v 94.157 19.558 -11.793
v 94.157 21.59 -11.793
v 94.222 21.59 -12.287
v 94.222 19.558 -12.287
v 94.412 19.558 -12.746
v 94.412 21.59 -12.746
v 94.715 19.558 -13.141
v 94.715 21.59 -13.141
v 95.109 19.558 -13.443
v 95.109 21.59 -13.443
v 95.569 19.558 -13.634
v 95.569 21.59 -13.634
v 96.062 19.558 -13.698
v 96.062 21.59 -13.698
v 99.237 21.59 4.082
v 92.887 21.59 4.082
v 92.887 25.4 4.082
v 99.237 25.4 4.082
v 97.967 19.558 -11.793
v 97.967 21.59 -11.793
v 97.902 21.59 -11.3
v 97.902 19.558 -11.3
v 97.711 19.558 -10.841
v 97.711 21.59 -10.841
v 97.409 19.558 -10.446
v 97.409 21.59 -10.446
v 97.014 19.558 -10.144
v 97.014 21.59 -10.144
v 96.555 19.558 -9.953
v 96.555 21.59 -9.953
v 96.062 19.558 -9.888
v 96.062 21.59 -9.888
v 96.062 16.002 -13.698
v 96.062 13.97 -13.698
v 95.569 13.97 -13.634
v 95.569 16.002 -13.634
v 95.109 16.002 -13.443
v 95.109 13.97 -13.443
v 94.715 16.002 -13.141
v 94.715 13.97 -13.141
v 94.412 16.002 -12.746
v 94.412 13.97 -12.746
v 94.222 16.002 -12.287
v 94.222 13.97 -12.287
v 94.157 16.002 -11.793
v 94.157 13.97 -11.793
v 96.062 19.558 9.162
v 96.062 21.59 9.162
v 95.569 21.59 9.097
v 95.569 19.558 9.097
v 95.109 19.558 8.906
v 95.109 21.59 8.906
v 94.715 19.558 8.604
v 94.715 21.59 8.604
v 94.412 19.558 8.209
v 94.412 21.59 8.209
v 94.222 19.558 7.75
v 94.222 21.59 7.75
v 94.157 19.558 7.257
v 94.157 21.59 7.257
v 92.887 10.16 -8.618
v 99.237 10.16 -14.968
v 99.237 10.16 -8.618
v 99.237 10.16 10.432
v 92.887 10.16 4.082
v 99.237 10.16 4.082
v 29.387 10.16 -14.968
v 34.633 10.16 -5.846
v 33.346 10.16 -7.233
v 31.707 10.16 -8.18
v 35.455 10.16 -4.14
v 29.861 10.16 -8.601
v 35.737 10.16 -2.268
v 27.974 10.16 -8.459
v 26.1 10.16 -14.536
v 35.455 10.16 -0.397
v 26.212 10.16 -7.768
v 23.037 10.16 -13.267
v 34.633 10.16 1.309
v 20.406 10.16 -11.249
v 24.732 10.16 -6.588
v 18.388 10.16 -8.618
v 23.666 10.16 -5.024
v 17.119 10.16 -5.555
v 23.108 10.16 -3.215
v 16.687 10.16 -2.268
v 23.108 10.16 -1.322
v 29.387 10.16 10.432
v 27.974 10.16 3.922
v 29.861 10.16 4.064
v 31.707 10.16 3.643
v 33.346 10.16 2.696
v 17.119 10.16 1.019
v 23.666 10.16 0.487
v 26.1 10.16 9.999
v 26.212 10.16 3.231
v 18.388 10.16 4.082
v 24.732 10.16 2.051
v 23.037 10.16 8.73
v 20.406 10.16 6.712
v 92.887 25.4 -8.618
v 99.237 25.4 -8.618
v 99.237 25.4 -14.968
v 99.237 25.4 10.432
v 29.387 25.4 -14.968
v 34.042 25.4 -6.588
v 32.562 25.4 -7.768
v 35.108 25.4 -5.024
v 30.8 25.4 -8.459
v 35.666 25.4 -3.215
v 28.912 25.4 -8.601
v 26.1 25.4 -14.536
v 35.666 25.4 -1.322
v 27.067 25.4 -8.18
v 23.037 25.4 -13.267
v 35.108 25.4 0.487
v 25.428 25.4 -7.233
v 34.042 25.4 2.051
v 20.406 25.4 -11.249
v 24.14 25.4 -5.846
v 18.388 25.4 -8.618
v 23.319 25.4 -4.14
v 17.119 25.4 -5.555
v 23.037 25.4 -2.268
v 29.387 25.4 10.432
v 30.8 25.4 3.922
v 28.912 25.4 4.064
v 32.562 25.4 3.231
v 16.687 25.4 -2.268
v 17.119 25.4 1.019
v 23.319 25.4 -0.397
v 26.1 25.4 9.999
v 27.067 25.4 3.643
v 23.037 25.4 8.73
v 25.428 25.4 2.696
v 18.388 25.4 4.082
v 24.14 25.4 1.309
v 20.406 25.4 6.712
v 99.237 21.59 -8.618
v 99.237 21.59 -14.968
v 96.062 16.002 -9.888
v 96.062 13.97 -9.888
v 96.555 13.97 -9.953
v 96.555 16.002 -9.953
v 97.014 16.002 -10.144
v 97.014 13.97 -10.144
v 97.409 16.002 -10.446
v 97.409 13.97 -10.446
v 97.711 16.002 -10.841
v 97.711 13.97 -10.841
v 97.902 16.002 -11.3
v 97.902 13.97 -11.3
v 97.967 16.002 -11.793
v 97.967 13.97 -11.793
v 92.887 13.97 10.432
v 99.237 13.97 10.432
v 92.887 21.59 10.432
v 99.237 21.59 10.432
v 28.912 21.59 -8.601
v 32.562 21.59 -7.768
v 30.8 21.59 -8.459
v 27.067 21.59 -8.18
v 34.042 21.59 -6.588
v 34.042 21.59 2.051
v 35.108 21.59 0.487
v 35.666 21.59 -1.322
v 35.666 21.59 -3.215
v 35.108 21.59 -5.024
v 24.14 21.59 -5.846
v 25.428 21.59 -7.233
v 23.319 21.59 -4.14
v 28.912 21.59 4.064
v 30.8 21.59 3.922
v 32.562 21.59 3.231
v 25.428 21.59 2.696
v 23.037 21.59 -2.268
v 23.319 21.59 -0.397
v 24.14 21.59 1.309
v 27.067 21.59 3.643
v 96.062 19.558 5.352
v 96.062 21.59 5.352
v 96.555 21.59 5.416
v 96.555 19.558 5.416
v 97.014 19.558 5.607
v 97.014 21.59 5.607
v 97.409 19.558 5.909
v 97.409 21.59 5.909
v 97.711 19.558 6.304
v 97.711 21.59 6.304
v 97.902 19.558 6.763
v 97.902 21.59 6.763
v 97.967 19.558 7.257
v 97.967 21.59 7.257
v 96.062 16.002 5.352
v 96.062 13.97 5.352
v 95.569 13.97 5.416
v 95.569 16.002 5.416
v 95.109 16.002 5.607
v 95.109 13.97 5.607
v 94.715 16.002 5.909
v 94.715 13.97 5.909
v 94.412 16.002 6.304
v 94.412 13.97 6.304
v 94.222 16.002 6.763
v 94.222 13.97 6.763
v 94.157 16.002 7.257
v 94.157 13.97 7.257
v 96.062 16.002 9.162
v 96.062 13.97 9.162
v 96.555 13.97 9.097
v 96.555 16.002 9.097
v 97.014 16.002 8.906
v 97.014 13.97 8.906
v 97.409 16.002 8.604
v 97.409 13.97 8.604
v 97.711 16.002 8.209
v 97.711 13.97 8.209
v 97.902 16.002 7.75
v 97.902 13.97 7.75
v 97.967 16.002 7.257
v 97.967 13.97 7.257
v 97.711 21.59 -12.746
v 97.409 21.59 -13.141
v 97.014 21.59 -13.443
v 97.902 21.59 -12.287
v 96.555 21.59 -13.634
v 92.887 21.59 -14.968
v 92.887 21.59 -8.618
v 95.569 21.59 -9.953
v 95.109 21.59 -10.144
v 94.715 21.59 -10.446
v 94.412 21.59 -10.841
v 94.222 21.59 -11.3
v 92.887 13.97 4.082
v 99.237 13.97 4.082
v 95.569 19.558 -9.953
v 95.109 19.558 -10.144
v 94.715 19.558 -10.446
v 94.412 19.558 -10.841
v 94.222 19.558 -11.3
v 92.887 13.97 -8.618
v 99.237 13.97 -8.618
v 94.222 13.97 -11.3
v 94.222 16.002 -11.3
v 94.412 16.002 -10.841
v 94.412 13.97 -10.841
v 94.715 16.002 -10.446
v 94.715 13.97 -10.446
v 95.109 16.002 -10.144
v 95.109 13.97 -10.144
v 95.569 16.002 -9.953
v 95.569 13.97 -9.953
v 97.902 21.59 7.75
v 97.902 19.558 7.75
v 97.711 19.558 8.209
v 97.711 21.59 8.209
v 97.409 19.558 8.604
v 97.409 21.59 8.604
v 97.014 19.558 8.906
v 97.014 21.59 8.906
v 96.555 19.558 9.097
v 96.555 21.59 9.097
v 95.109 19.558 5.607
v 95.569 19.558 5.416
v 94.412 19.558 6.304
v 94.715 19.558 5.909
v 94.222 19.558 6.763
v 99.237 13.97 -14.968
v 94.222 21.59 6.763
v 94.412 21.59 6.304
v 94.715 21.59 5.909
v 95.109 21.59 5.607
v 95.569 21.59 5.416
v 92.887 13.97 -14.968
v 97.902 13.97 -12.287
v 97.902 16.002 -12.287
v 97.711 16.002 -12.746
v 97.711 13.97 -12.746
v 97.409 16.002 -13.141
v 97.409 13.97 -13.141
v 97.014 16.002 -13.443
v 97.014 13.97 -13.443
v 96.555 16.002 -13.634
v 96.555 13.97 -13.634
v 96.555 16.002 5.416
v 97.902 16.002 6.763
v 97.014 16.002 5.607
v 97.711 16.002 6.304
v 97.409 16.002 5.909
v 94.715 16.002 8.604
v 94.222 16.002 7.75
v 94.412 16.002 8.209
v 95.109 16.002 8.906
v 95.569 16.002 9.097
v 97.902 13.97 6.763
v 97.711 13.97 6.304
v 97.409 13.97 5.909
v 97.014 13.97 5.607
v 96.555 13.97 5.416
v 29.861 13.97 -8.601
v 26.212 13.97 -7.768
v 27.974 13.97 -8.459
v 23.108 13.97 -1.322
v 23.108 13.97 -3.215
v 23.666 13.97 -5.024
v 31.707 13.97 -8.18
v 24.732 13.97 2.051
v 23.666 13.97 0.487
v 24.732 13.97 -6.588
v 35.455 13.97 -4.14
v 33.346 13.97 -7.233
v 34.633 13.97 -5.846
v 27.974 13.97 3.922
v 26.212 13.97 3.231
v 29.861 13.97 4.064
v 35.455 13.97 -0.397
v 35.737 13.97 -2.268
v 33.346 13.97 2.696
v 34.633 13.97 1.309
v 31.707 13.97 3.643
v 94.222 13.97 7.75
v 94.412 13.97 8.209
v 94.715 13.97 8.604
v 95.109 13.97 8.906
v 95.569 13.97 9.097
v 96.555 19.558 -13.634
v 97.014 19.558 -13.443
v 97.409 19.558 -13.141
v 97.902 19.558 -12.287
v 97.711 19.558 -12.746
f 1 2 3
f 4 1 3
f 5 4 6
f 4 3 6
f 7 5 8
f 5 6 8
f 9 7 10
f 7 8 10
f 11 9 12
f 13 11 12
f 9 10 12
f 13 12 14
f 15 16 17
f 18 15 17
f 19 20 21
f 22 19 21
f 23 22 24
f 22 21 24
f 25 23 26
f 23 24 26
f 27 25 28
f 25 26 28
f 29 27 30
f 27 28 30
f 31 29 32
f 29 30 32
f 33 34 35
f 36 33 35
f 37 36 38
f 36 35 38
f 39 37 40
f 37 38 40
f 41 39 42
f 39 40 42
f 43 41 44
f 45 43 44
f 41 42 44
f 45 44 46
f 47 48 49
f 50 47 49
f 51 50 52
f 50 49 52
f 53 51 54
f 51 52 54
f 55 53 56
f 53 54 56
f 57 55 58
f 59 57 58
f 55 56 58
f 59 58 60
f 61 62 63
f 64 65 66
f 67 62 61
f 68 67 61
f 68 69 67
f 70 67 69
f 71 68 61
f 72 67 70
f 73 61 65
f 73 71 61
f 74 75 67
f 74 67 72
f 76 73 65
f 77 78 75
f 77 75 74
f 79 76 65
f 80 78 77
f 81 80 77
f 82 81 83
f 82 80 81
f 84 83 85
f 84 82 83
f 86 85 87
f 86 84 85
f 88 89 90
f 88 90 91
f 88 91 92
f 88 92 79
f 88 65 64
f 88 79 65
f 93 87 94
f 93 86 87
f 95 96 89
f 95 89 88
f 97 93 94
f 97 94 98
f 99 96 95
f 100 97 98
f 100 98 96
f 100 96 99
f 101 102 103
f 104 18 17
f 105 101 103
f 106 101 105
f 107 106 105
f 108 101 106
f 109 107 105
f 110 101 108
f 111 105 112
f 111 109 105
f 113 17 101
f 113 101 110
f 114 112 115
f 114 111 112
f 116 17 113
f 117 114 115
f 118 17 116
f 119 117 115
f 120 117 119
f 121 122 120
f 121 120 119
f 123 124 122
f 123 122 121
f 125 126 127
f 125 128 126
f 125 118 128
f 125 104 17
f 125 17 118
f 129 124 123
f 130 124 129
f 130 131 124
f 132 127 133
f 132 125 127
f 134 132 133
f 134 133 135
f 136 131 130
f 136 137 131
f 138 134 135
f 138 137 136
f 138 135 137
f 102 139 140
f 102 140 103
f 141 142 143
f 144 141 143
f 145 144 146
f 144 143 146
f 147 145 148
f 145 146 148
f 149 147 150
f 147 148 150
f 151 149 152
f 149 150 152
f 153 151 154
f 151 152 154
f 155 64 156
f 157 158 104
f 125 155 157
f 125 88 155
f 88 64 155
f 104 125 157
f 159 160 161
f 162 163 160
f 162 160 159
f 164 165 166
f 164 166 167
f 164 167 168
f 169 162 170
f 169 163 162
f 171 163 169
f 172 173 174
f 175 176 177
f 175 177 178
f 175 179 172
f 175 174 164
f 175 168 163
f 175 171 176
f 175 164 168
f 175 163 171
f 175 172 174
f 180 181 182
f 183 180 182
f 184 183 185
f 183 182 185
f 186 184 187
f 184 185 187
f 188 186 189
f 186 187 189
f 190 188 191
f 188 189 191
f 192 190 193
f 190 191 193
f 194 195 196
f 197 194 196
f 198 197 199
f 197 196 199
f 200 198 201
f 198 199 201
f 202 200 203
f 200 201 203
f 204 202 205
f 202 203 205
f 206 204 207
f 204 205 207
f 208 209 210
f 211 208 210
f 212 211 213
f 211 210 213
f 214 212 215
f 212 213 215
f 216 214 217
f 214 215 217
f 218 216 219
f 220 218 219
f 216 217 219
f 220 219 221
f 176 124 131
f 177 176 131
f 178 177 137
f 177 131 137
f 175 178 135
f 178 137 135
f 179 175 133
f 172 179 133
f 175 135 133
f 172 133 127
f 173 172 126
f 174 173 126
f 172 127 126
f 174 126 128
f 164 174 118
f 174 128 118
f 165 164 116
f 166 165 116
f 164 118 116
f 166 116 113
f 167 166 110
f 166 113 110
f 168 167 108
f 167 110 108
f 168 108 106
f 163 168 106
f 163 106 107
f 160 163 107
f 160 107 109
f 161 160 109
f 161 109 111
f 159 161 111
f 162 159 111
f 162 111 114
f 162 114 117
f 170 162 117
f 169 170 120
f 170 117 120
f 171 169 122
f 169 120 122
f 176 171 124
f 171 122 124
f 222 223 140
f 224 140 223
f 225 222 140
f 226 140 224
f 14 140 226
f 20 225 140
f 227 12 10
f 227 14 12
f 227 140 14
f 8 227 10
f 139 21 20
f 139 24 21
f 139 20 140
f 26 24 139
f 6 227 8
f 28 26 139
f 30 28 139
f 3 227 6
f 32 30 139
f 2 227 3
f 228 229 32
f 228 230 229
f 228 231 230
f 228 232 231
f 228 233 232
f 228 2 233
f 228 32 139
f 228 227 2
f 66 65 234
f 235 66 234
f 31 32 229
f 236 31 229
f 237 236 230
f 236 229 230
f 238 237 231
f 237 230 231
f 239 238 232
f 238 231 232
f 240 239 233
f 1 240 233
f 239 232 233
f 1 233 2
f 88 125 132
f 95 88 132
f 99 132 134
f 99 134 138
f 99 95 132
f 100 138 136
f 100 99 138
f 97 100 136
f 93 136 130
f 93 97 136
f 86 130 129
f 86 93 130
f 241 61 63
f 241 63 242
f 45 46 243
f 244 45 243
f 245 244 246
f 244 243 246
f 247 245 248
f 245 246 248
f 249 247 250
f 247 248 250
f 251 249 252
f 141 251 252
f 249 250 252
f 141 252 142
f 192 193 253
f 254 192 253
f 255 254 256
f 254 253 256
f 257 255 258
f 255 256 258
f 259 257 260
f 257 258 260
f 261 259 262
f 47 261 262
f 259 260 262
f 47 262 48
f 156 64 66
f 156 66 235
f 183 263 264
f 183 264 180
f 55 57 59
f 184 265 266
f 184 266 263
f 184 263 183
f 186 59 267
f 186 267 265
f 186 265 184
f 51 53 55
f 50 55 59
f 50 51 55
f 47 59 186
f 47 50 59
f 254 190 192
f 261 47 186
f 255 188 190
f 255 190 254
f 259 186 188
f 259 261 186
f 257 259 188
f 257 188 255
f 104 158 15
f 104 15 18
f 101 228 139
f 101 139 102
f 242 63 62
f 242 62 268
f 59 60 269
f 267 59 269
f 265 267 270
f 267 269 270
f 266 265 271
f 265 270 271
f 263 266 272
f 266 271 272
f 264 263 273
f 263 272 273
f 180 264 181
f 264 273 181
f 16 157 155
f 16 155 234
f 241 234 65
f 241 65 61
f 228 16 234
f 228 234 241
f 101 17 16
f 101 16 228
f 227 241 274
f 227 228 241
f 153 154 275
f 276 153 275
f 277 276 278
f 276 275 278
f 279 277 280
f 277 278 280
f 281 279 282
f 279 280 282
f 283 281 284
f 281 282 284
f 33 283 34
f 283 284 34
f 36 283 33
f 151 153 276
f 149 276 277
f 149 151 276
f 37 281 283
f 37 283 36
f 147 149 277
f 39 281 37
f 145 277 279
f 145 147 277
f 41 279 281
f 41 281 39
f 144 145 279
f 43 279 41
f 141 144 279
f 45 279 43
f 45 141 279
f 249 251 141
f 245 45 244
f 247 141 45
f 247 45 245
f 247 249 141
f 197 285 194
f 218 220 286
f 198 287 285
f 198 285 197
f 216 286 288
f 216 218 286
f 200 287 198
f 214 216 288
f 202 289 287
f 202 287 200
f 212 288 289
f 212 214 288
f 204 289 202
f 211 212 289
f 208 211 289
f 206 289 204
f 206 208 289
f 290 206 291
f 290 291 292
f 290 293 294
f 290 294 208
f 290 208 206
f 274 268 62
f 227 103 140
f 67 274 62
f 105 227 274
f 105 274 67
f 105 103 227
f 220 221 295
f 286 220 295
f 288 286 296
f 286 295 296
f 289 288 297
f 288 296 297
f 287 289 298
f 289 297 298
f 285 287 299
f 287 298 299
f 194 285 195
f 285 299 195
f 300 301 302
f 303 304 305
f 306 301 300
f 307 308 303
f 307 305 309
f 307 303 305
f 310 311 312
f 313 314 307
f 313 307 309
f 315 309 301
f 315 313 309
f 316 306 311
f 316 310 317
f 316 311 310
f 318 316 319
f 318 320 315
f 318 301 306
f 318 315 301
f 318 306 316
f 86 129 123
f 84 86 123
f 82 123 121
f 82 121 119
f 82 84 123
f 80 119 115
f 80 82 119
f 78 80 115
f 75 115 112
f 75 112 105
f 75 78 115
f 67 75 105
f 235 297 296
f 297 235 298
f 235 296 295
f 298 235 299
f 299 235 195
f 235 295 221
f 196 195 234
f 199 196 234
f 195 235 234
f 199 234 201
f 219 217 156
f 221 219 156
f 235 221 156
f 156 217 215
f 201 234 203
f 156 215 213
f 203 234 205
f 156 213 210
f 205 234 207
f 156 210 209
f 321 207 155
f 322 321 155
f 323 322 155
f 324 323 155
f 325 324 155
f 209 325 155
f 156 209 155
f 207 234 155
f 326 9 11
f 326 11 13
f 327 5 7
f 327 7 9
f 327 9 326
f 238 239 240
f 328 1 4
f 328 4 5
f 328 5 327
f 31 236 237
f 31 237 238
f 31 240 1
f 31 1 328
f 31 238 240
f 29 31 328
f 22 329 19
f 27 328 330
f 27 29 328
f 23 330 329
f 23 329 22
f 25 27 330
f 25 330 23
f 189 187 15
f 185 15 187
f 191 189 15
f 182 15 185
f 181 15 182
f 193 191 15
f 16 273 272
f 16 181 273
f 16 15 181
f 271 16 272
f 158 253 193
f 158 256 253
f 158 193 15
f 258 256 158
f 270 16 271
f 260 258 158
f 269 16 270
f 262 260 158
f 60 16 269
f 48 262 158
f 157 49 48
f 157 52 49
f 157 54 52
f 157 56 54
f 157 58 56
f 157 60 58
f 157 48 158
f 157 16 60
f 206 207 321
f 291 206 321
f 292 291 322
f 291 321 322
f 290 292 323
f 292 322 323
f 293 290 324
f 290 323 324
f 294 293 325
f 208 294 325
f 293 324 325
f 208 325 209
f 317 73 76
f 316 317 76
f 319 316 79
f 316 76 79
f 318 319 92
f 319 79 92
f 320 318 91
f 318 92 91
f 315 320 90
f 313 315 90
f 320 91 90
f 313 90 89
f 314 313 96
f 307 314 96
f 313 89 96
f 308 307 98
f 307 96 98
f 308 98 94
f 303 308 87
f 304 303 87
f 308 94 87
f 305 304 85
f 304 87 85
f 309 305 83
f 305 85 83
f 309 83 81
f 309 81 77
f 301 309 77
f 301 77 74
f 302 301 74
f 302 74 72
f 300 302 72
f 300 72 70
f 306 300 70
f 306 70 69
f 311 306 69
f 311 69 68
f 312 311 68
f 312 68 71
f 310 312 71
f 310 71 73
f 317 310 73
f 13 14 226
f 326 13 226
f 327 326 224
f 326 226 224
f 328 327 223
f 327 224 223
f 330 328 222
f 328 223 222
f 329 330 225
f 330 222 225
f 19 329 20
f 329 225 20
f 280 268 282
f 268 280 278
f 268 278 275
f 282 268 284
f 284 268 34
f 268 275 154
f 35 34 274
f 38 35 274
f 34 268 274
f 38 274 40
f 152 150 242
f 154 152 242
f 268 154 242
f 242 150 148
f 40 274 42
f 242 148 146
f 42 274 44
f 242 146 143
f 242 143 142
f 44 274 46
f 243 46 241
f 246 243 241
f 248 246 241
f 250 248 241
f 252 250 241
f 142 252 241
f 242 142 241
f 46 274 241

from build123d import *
from build123d import SkipClean  # not in build123d's __all__

# Parameters (mm, degrees)
F0_R      = 6.35
F1_DEPTH  = 25.4
F2_R      = 6.35
F3_DEPTH  = 25.4
F4_DEPTH  = 5.08
F5_DEPTH  = 8.89
F6_DEPTH  = 20.32
F7_DEPTH  = 10.16
F8_DEPTH  = 5.08
F9_DEPTH  = 13.97
F10_DEPTH = 3.81
F11_W     = 3.81
F11_H     = 6.35
F12_DEPTH = 6.35
F17_DEPTH = 2.032
F18_DEPTH = 2.032


with BuildPart() as f1:
    # F0 (on Front) → F1 (new body)
    with BuildSketch(Plane.XZ):
        with BuildLine():
            ThreePointArc((42.0866659097, -2.2684633732), (38.3669220307, 6.7117927479), (29.3866659097, 10.4315366268))
            ThreePointArc((29.3866659097, 10.4315366268), (20.4064097886, 6.7117927479), (16.6866659097, -2.2684633732))
            ThreePointArc((16.6866659097, -2.2684633732), (20.4064097886, -11.2487194943), (29.3866659097, -14.9684633732))
            ThreePointArc((29.3866659097, -14.9684633732), (38.3669220307, -11.2487194943), (42.0866659097, -2.2684633732))
        make_face()
        with Locations((29.3866659097, -2.2684633732)):
            Circle(F0_R, mode=Mode.SUBTRACT)
        with Locations((29.3866659097, -2.2684633732)):
            Circle(F0_R)
        with BuildLine():
            Line((92.8866659097, 10.4315366268), (29.3866659097, 10.4315366268))
            ThreePointArc((29.3866659097, 10.4315366268), (38.3669220307, 6.7117927479), (42.0866659097, -2.2684633732))
            ThreePointArc((42.0866659097, -2.2684633732), (38.3669220307, -11.2487194943), (29.3866659097, -14.9684633732))
            Line((29.3866659097, -14.9684633732), (92.8866659097, -14.9684633732))
            Line((92.8866659097, -14.9684633732), (92.8866659097, 10.4315366268))
        make_face()
    extrude(amount=-F1_DEPTH)

    # F2 (on face) → F3 (cut, through all)
    with BuildSketch(Plane(origin=(0, 25.4, 0), x_dir=(-1, 0, 0), z_dir=(0, 1, 0))):
        with BuildLine():
            ThreePointArc((-29.3866659097, -14.9684633732), (-42.0866659097, -2.2684633732), (-29.3866659097, 10.4315366268))
            Line((-29.3866659097, 10.4315366268), (-92.8866659097, 10.4315366268))
            Line((-92.8866659097, 10.4315366268), (-92.8866659097, -14.9684633732))
            Line((-92.8866659097, -14.9684633732), (-29.3866659097, -14.9684633732))
        make_face()
        with Locations((-29.3866659097, -2.2684633732)):
            Circle(F2_R)
    with SkipClean():  # cleaning this boolean's faces spoils the solid; the shape is the same uncleaned
        extrude(amount=-F3_DEPTH, mode=Mode.SUBTRACT)

    # F2 (on face) → F4 (join)
    with BuildSketch(Plane(origin=(0, 25.4, 0), x_dir=(-1, 0, 0), z_dir=(0, 1, 0))):
        with BuildLine():
            ThreePointArc((-29.3866659097, -14.9684633732), (-42.0866659097, -2.2684633732), (-29.3866659097, 10.4315366268))
            Line((-29.3866659097, 10.4315366268), (-92.8866659097, 10.4315366268))
            Line((-92.8866659097, 10.4315366268), (-92.8866659097, -14.9684633732))
            Line((-92.8866659097, -14.9684633732), (-29.3866659097, -14.9684633732))
        make_face()
    extrude(amount=-F4_DEPTH)

    # F2 (on face) → F5 (join)
    with BuildSketch(Plane(origin=(0, 25.4, 0), x_dir=(-1, 0, 0), z_dir=(0, 1, 0))):
        with Locations((-29.3866659097, -2.2684633732)):
            Circle(F2_R)
    extrude(amount=-F5_DEPTH)

    # F2 (on face) → F6 (join)
    with BuildSketch(Plane(origin=(0, 25.4, 0), x_dir=(-1, 0, 0), z_dir=(0, 1, 0))):
        with BuildLine():
            ThreePointArc((-29.3866659097, -14.9684633732), (-42.0866659097, -2.2684633732), (-29.3866659097, 10.4315366268))
            Line((-29.3866659097, 10.4315366268), (-92.8866659097, 10.4315366268))
            Line((-92.8866659097, 10.4315366268), (-92.8866659097, -14.9684633732))
            Line((-92.8866659097, -14.9684633732), (-29.3866659097, -14.9684633732))
        make_face()
        with Locations((-29.3866659097, -2.2684633732)):
            Circle(F2_R)
    extrude(amount=-F6_DEPTH)

    # F7 (cut): a face of the model
    f7_faces = [f1.faces().sort_by_distance(p)[0] for p in [
        (29.3866659097, 0, 10.072326382),
    ]]
    extrude(f7_faces, amount=-F7_DEPTH, mode=Mode.SUBTRACT)

    # F8 (cut): a face of the model
    f8_faces = [f1.faces().sort_by_distance(p)[0] for p in [
        (66.0488875518, 5.08, -2.2684633732),
    ]]
    extrude(f8_faces, amount=-F8_DEPTH, mode=Mode.SUBTRACT)

    # F0 (on Front) → F9 (cut)
    with BuildSketch(Plane.XZ):
        with Locations((29.3866659097, -2.2684633732)):
            Circle(F0_R)
    extrude(amount=-F9_DEPTH, mode=Mode.SUBTRACT)

    # F2 (on face) → F10 (cut)
    with BuildSketch(Plane(origin=(0, 25.4, 0), x_dir=(-1, 0, 0), z_dir=(0, 1, 0))):
        with Locations((-29.3866659097, -2.2684633732)):
            Circle(F2_R)
    extrude(amount=-F10_DEPTH, mode=Mode.SUBTRACT)

    # F11 (on face) → F12 (join)
    with BuildSketch(Plane.YZ.offset(92.8866659097)):
        with Locations((12.065, 7.2565366268)):
            Rectangle(F11_W, F11_H)
        with Locations((23.495, 7.2565366268)):
            Rectangle(F11_W, F11_H)
        with Locations((23.495, -11.7934633732)):
            Rectangle(F11_W, F11_H)
        with Locations((12.065, -11.7934633732)):
            Rectangle(F11_W, F11_H)
    extrude(amount=F12_DEPTH)

    # F15 (on face) + F13 (on face) → F17 (join)
    with BuildSketch(Plane(origin=(0, 13.97, 0), x_dir=(-1, 0, 0), z_dir=(0, 1, 0))):
        with BuildLine():
            Line((-96.0616659097, -11.7934633732), (-94.1566659097, -11.7934633732))
            ThreePointArc((-94.1566659097, -11.7934633732), (-94.7146274915, -10.446424955), (-96.0616659097, -9.8884633732))
            Line((-96.0616659097, -9.8884633732), (-96.0616659097, -11.7934633732))
        make_face()
        with BuildLine():
            Line((-97.9666659097, -11.7934633732), (-96.0616659097, -11.7934633732))
            Line((-96.0616659097, -11.7934633732), (-96.0616659097, -9.8884633732))
            ThreePointArc((-96.0616659097, -9.8884633732), (-97.4087043278, -10.446424955), (-97.9666659097, -11.7934633732))
        make_face()
        with BuildLine():
            Line((-96.0616659097, -13.6984633732), (-96.0616659097, -11.7934633732))
            Line((-96.0616659097, -11.7934633732), (-97.9666659097, -11.7934633732))
            ThreePointArc((-97.9666659097, -11.7934633732), (-97.4087043278, -13.1405017913), (-96.0616659097, -13.6984633732))
        make_face()
        with BuildLine():
            ThreePointArc((-96.0616659097, -13.6984633732), (-94.7146274915, -13.1405017913), (-94.1566659097, -11.7934633732))
            Line((-94.1566659097, -11.7934633732), (-96.0616659097, -11.7934633732))
            Line((-96.0616659097, -11.7934633732), (-96.0616659097, -13.6984633732))
        make_face()
    with BuildSketch(Plane(origin=(0, 13.97, 0), x_dir=(-1, 0, 0), z_dir=(0, 1, 0))):
        with BuildLine():
            Line((-96.0616659097, 7.2565366268), (-96.0616659097, 9.1615366268))
            ThreePointArc((-96.0616659097, 9.1615366268), (-97.4087043278, 8.603575045), (-97.9666659097, 7.2565366268))
            Line((-97.9666659097, 7.2565366268), (-96.0616659097, 7.2565366268))
        make_face()
        with BuildLine():
            Line((-96.0616659097, 7.2565366268), (-94.1566659097, 7.2565366268))
            ThreePointArc((-94.1566659097, 7.2565366268), (-94.7146274915, 8.603575045), (-96.0616659097, 9.1615366268))
            Line((-96.0616659097, 9.1615366268), (-96.0616659097, 7.2565366268))
        make_face()
        with BuildLine():
            ThreePointArc((-97.9666659097, 7.2565366268), (-97.4087043278, 5.9094982087), (-96.0616659097, 5.3515366268))
            Line((-96.0616659097, 5.3515366268), (-96.0616659097, 7.2565366268))
            Line((-96.0616659097, 7.2565366268), (-97.9666659097, 7.2565366268))
        make_face()
        with BuildLine():
            ThreePointArc((-96.0616659097, 5.3515366268), (-94.7146274915, 5.9094982087), (-94.1566659097, 7.2565366268))
            Line((-94.1566659097, 7.2565366268), (-96.0616659097, 7.2565366268))
            Line((-96.0616659097, 7.2565366268), (-96.0616659097, 5.3515366268))
        make_face()
    extrude(amount=F17_DEPTH)

    # F14 (on face) + F16 (on face) → F18 (join)
    with BuildSketch(Plane.XZ.offset(-21.59)):
        with BuildLine():
            Line((96.0616659097, 7.2565366268), (96.0616659097, 9.1615366268))
            ThreePointArc((96.0616659097, 9.1615366268), (94.7146274915, 8.603575045), (94.1566659097, 7.2565366268))
            Line((94.1566659097, 7.2565366268), (96.0616659097, 7.2565366268))
        make_face()
        with BuildLine():
            Line((96.0616659097, 7.2565366268), (97.9666659097, 7.2565366268))
            ThreePointArc((97.9666659097, 7.2565366268), (97.4087043278, 8.603575045), (96.0616659097, 9.1615366268))
            Line((96.0616659097, 9.1615366268), (96.0616659097, 7.2565366268))
        make_face()
        with BuildLine():
            ThreePointArc((96.0616659097, 5.3515366268), (97.4087043278, 5.9094982087), (97.9666659097, 7.2565366268))
            Line((97.9666659097, 7.2565366268), (96.0616659097, 7.2565366268))
            Line((96.0616659097, 7.2565366268), (96.0616659097, 5.3515366268))
        make_face()
        with BuildLine():
            ThreePointArc((94.1566659097, 7.2565366268), (94.7146274915, 5.9094982087), (96.0616659097, 5.3515366268))
            Line((96.0616659097, 5.3515366268), (96.0616659097, 7.2565366268))
            Line((96.0616659097, 7.2565366268), (94.1566659097, 7.2565366268))
        make_face()
    with BuildSketch(Plane.XZ.offset(-21.59)):
        with BuildLine():
            Line((94.1566659097, -11.7934633732), (96.0616659097, -11.7934633732))
            Line((96.0616659097, -11.7934633732), (96.0616659097, -9.8884633732))
            ThreePointArc((96.0616659097, -9.8884633732), (94.7146274915, -10.446424955), (94.1566659097, -11.7934633732))
        make_face()
        with BuildLine():
            Line((96.0616659097, -9.8884633732), (96.0616659097, -11.7934633732))
            Line((96.0616659097, -11.7934633732), (97.9666659097, -11.7934633732))
            ThreePointArc((97.9666659097, -11.7934633732), (97.4087043278, -10.446424955), (96.0616659097, -9.8884633732))
        make_face()
        with BuildLine():
            Line((96.0616659097, -11.7934633732), (96.0616659097, -13.6984633732))
            ThreePointArc((96.0616659097, -13.6984633732), (97.4087043278, -13.1405017913), (97.9666659097, -11.7934633732))
            Line((97.9666659097, -11.7934633732), (96.0616659097, -11.7934633732))
        make_face()
        with BuildLine():
            ThreePointArc((94.1566659097, -11.7934633732), (94.7146274915, -13.1405017913), (96.0616659097, -13.6984633732))
            Line((96.0616659097, -13.6984633732), (96.0616659097, -11.7934633732))
            Line((96.0616659097, -11.7934633732), (94.1566659097, -11.7934633732))
        make_face()
    extrude(amount=F18_DEPTH)


solid = f1.part
